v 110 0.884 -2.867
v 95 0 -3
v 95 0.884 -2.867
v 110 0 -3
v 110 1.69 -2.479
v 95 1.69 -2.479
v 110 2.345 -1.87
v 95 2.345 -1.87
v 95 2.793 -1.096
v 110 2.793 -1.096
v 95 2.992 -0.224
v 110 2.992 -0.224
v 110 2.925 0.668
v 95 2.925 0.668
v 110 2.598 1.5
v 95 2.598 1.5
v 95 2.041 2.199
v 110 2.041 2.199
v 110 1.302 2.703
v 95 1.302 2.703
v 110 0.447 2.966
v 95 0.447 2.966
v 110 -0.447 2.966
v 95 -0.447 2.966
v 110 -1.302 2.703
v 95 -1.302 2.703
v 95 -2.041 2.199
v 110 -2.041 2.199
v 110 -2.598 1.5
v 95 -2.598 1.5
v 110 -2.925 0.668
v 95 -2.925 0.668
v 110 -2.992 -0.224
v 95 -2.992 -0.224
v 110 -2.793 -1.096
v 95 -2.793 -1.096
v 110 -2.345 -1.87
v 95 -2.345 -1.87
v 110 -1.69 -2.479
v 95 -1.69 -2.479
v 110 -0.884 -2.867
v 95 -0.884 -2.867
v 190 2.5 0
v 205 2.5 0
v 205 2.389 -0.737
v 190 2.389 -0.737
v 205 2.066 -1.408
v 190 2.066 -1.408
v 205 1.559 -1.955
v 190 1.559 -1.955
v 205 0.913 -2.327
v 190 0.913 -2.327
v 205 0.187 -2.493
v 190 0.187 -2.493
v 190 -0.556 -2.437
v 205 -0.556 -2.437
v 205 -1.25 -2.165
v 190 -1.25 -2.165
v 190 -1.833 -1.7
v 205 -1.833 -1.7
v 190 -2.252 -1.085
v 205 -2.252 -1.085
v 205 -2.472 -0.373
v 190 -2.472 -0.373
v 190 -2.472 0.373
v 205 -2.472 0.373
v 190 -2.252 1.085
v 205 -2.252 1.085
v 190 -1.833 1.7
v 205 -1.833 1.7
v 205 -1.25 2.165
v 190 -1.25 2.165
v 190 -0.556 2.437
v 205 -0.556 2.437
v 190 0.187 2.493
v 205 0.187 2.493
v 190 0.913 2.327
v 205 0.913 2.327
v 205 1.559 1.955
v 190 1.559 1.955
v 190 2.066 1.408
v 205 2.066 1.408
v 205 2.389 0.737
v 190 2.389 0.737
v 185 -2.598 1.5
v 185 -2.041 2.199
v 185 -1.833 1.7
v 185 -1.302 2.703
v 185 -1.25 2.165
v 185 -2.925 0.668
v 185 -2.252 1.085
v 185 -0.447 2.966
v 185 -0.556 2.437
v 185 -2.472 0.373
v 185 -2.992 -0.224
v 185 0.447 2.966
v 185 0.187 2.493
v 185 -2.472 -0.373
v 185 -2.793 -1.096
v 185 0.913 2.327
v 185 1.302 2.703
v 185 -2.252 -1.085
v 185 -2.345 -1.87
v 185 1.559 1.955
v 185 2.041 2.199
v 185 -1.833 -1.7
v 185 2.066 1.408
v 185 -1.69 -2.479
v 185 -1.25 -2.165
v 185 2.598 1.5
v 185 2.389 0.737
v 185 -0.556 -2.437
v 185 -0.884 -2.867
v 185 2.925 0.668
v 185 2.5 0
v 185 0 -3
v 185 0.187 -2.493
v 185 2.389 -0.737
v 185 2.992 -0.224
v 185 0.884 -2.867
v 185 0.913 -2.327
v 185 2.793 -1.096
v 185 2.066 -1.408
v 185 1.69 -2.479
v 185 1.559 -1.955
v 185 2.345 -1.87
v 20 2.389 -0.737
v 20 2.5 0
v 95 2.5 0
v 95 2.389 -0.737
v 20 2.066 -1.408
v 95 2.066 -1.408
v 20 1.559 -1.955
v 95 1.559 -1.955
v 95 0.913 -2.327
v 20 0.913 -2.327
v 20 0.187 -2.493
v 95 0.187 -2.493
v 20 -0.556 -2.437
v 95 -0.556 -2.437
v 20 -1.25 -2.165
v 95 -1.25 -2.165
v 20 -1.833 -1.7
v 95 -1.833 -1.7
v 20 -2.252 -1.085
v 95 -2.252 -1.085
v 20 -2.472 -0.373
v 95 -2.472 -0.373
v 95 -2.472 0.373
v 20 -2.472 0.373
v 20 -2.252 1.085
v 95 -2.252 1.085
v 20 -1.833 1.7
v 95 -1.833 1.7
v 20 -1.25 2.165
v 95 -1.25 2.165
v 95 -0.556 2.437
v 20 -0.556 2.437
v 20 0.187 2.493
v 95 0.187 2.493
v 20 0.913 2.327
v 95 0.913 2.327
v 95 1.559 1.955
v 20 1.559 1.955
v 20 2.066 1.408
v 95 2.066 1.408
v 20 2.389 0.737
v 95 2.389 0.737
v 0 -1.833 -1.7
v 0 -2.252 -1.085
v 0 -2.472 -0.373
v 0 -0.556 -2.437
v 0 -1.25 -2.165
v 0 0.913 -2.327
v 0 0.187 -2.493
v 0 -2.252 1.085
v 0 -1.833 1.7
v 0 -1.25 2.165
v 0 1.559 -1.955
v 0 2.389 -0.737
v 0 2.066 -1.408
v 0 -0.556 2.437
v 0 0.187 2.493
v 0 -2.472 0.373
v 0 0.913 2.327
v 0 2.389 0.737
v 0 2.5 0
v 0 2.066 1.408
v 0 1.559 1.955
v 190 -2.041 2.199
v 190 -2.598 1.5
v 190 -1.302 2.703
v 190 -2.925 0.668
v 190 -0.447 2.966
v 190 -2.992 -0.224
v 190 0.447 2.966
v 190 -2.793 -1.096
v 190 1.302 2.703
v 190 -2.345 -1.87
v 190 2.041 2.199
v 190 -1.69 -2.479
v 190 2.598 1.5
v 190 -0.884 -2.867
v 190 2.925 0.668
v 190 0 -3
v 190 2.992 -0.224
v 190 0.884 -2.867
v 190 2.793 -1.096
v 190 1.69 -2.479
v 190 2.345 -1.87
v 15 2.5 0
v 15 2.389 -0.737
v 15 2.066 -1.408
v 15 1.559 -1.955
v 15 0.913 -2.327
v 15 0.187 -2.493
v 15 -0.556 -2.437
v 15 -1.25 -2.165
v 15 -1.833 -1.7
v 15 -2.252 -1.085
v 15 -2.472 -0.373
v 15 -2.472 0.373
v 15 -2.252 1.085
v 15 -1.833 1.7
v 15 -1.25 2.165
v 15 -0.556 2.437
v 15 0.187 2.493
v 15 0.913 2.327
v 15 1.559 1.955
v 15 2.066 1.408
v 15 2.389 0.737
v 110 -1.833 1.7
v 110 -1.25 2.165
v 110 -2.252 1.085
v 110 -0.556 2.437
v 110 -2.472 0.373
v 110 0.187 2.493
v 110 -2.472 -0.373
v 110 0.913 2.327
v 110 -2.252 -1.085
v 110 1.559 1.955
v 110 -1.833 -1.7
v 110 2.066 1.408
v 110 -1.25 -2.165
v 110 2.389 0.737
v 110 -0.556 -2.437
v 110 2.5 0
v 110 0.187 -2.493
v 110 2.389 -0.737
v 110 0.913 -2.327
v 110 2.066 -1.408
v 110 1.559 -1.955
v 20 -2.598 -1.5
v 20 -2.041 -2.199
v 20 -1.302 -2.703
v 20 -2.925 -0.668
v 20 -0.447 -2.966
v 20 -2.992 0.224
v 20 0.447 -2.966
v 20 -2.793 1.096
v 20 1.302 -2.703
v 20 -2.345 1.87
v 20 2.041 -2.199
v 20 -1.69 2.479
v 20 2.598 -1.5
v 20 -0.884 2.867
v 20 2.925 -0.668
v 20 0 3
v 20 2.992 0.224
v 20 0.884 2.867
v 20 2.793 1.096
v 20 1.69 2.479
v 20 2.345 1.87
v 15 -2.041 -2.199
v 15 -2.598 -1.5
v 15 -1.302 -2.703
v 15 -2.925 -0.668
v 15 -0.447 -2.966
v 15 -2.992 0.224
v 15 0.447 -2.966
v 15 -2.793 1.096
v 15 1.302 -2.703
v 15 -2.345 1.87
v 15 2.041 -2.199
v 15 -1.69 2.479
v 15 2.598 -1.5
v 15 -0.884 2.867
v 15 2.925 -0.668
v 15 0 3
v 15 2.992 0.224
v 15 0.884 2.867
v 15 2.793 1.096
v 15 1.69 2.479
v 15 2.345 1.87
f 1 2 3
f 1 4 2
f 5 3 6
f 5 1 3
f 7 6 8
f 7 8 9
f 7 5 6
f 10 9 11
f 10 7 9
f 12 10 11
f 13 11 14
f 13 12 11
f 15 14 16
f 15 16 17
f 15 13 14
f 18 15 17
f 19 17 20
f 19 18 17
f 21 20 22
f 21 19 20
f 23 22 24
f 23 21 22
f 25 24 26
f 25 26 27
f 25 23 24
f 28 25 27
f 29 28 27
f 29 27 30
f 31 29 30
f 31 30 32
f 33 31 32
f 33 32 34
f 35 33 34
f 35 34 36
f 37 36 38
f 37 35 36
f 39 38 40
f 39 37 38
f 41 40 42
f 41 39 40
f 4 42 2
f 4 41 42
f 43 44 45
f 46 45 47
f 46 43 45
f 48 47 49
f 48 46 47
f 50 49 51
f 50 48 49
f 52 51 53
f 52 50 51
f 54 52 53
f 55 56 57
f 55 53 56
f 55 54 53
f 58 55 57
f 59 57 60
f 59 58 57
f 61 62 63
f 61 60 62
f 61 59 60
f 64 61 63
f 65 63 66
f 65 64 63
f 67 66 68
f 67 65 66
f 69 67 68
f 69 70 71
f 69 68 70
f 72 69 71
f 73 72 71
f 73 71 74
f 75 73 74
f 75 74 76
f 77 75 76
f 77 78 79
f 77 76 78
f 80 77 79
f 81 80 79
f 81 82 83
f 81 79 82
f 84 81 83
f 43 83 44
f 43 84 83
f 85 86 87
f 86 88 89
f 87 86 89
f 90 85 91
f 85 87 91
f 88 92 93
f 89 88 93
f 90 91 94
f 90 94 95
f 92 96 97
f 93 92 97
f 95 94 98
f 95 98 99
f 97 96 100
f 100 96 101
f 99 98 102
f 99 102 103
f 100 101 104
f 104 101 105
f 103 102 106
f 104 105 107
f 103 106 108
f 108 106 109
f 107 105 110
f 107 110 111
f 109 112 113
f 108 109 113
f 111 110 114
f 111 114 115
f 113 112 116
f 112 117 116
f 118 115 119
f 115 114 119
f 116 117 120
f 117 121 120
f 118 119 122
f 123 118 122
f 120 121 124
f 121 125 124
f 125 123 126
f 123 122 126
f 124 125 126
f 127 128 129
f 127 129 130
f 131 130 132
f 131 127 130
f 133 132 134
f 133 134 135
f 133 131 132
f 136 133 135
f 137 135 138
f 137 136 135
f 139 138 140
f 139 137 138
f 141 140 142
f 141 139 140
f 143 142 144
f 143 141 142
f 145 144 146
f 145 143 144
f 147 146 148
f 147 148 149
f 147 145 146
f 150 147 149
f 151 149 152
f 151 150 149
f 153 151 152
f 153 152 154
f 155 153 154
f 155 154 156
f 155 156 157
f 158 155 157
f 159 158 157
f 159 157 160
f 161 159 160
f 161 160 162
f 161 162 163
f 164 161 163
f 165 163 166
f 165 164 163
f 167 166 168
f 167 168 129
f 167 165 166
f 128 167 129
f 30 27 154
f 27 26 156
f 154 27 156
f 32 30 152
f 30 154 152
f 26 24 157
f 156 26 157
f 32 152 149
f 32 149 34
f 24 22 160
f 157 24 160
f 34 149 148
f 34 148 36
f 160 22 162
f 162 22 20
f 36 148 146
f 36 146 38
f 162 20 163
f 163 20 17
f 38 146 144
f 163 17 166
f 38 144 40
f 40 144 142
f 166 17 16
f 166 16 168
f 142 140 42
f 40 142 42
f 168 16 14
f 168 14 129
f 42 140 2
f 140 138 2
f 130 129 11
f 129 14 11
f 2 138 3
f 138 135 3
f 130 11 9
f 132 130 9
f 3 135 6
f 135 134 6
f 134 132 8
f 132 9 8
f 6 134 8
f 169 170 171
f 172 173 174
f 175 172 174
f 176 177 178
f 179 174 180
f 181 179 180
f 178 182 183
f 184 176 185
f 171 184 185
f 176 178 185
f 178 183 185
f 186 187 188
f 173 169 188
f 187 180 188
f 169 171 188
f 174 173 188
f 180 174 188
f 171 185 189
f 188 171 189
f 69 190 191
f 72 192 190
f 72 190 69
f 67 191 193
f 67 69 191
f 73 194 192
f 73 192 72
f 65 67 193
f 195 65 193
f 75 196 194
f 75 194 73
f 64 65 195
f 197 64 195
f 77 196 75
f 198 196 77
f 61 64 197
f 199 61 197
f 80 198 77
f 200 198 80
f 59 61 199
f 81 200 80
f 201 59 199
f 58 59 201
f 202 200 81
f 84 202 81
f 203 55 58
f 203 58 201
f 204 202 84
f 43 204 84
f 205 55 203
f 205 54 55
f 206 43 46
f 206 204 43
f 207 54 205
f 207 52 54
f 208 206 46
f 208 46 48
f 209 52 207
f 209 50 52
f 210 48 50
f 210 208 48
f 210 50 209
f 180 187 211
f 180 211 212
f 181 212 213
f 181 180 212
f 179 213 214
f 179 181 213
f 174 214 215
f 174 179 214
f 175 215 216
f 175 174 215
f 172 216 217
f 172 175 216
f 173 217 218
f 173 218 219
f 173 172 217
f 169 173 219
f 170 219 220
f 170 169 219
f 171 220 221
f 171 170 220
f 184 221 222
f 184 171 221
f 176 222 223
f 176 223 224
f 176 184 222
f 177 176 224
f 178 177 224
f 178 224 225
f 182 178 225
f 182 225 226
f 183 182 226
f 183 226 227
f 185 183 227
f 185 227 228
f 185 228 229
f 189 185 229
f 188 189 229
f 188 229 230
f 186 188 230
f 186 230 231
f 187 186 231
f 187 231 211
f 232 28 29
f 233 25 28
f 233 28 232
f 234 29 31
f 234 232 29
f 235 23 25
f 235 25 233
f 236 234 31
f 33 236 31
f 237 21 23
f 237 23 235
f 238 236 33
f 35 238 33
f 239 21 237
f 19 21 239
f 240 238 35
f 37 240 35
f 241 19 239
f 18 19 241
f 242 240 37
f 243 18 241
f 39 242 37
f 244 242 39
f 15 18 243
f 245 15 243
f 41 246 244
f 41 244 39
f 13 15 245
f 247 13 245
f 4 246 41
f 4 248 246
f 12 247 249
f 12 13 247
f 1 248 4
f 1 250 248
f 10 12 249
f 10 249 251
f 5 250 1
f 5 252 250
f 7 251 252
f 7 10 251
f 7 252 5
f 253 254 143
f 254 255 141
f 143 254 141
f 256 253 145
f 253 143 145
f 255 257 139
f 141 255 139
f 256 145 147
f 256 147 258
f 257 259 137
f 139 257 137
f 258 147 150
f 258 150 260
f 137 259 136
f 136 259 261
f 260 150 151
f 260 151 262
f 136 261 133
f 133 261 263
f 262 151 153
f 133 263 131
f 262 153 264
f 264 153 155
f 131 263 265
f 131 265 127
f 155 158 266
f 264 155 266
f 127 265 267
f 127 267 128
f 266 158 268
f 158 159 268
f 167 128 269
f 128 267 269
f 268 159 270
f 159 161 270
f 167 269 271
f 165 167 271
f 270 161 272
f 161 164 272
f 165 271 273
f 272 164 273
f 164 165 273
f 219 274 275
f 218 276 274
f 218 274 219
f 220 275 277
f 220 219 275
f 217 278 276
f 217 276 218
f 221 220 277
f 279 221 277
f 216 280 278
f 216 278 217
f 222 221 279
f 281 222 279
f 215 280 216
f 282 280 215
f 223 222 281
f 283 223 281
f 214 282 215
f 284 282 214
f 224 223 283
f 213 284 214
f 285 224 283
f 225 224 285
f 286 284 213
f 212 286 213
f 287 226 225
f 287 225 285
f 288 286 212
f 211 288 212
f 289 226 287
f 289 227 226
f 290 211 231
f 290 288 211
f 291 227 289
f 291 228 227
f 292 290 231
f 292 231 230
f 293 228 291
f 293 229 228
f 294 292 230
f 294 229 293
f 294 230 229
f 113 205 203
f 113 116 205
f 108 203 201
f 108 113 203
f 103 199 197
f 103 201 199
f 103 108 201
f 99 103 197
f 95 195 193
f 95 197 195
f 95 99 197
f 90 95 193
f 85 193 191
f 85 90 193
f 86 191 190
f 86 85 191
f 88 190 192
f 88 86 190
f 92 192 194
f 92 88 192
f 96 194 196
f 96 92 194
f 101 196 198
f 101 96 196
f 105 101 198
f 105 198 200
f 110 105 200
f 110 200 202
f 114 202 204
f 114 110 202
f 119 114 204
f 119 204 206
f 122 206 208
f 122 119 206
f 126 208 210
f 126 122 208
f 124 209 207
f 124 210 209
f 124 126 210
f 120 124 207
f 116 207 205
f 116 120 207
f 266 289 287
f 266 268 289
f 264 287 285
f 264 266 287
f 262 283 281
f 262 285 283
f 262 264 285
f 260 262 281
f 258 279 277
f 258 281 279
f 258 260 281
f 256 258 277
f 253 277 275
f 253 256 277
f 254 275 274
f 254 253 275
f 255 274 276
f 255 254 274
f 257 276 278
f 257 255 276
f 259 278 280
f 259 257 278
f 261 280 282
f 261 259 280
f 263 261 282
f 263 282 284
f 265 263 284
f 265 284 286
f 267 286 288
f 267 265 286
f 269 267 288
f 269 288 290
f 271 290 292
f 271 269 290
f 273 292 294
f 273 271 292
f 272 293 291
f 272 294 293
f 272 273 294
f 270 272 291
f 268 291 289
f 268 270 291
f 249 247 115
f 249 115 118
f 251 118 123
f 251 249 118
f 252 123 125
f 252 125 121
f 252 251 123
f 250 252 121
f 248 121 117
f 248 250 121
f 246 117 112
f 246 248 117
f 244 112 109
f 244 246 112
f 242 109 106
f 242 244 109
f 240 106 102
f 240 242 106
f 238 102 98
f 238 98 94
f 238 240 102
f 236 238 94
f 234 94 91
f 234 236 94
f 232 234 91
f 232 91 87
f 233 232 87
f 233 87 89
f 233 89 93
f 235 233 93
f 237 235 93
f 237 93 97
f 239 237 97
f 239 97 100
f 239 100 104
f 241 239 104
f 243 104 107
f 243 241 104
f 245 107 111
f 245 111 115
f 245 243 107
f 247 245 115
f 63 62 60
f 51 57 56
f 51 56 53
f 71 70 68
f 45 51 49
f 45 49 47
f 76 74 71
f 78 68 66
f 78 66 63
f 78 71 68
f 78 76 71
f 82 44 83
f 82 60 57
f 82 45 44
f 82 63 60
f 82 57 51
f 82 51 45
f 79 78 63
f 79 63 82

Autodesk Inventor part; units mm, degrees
sketch "Sketch1" plane through (0, 0, 0) normal (1, 0, 0) x (0, 1, 0)
  circle A0 centre (0, 0) radius 2.5
  dimension "d0" = 5
extrude "Extrusion1" add sketch "Sketch1" along normal blind 205
ref_plane "Work Plane1" through (185, 0, 0) normal (1, 0, 0) x (0, 0, -1)
sketch "Sketch2" plane through (185, 0, 0) normal (1, 0, 0) x (0, 0, -1)
  circle A0 centre (0, 0) radius 3
  dimension "d4" = 6
extrude "Extrusion2" add sketch "Sketch2" along normal blind 5
ref_plane "Work Plane2" through (20, 0, 0) normal (-1, 0, 0) x (0, 0, 1)
sketch "Sketch3" plane through (20, 0, 0) normal (-1, 0, 0) x (0, 0, 1)
  circle A0 centre (0, 0) radius 3
  dimension "d8" = 6
extrude "Extrusion3" add sketch "Sketch3" along normal blind 5
ref_plane "Work Plane3" through (102.5, 0, 0) normal (1, 0, 0) x (0, 0, -1)
sketch "Sketch4" plane through (102.5, 0, 0) normal (1, 0, 0) x (0, 0, -1)
  circle A0 centre (0, 0) radius 3
  dimension "d11" = 6
extrude "Extrusion4" add sketch "Sketch4" along normal mid plane 15
properties part number "roller stick"
